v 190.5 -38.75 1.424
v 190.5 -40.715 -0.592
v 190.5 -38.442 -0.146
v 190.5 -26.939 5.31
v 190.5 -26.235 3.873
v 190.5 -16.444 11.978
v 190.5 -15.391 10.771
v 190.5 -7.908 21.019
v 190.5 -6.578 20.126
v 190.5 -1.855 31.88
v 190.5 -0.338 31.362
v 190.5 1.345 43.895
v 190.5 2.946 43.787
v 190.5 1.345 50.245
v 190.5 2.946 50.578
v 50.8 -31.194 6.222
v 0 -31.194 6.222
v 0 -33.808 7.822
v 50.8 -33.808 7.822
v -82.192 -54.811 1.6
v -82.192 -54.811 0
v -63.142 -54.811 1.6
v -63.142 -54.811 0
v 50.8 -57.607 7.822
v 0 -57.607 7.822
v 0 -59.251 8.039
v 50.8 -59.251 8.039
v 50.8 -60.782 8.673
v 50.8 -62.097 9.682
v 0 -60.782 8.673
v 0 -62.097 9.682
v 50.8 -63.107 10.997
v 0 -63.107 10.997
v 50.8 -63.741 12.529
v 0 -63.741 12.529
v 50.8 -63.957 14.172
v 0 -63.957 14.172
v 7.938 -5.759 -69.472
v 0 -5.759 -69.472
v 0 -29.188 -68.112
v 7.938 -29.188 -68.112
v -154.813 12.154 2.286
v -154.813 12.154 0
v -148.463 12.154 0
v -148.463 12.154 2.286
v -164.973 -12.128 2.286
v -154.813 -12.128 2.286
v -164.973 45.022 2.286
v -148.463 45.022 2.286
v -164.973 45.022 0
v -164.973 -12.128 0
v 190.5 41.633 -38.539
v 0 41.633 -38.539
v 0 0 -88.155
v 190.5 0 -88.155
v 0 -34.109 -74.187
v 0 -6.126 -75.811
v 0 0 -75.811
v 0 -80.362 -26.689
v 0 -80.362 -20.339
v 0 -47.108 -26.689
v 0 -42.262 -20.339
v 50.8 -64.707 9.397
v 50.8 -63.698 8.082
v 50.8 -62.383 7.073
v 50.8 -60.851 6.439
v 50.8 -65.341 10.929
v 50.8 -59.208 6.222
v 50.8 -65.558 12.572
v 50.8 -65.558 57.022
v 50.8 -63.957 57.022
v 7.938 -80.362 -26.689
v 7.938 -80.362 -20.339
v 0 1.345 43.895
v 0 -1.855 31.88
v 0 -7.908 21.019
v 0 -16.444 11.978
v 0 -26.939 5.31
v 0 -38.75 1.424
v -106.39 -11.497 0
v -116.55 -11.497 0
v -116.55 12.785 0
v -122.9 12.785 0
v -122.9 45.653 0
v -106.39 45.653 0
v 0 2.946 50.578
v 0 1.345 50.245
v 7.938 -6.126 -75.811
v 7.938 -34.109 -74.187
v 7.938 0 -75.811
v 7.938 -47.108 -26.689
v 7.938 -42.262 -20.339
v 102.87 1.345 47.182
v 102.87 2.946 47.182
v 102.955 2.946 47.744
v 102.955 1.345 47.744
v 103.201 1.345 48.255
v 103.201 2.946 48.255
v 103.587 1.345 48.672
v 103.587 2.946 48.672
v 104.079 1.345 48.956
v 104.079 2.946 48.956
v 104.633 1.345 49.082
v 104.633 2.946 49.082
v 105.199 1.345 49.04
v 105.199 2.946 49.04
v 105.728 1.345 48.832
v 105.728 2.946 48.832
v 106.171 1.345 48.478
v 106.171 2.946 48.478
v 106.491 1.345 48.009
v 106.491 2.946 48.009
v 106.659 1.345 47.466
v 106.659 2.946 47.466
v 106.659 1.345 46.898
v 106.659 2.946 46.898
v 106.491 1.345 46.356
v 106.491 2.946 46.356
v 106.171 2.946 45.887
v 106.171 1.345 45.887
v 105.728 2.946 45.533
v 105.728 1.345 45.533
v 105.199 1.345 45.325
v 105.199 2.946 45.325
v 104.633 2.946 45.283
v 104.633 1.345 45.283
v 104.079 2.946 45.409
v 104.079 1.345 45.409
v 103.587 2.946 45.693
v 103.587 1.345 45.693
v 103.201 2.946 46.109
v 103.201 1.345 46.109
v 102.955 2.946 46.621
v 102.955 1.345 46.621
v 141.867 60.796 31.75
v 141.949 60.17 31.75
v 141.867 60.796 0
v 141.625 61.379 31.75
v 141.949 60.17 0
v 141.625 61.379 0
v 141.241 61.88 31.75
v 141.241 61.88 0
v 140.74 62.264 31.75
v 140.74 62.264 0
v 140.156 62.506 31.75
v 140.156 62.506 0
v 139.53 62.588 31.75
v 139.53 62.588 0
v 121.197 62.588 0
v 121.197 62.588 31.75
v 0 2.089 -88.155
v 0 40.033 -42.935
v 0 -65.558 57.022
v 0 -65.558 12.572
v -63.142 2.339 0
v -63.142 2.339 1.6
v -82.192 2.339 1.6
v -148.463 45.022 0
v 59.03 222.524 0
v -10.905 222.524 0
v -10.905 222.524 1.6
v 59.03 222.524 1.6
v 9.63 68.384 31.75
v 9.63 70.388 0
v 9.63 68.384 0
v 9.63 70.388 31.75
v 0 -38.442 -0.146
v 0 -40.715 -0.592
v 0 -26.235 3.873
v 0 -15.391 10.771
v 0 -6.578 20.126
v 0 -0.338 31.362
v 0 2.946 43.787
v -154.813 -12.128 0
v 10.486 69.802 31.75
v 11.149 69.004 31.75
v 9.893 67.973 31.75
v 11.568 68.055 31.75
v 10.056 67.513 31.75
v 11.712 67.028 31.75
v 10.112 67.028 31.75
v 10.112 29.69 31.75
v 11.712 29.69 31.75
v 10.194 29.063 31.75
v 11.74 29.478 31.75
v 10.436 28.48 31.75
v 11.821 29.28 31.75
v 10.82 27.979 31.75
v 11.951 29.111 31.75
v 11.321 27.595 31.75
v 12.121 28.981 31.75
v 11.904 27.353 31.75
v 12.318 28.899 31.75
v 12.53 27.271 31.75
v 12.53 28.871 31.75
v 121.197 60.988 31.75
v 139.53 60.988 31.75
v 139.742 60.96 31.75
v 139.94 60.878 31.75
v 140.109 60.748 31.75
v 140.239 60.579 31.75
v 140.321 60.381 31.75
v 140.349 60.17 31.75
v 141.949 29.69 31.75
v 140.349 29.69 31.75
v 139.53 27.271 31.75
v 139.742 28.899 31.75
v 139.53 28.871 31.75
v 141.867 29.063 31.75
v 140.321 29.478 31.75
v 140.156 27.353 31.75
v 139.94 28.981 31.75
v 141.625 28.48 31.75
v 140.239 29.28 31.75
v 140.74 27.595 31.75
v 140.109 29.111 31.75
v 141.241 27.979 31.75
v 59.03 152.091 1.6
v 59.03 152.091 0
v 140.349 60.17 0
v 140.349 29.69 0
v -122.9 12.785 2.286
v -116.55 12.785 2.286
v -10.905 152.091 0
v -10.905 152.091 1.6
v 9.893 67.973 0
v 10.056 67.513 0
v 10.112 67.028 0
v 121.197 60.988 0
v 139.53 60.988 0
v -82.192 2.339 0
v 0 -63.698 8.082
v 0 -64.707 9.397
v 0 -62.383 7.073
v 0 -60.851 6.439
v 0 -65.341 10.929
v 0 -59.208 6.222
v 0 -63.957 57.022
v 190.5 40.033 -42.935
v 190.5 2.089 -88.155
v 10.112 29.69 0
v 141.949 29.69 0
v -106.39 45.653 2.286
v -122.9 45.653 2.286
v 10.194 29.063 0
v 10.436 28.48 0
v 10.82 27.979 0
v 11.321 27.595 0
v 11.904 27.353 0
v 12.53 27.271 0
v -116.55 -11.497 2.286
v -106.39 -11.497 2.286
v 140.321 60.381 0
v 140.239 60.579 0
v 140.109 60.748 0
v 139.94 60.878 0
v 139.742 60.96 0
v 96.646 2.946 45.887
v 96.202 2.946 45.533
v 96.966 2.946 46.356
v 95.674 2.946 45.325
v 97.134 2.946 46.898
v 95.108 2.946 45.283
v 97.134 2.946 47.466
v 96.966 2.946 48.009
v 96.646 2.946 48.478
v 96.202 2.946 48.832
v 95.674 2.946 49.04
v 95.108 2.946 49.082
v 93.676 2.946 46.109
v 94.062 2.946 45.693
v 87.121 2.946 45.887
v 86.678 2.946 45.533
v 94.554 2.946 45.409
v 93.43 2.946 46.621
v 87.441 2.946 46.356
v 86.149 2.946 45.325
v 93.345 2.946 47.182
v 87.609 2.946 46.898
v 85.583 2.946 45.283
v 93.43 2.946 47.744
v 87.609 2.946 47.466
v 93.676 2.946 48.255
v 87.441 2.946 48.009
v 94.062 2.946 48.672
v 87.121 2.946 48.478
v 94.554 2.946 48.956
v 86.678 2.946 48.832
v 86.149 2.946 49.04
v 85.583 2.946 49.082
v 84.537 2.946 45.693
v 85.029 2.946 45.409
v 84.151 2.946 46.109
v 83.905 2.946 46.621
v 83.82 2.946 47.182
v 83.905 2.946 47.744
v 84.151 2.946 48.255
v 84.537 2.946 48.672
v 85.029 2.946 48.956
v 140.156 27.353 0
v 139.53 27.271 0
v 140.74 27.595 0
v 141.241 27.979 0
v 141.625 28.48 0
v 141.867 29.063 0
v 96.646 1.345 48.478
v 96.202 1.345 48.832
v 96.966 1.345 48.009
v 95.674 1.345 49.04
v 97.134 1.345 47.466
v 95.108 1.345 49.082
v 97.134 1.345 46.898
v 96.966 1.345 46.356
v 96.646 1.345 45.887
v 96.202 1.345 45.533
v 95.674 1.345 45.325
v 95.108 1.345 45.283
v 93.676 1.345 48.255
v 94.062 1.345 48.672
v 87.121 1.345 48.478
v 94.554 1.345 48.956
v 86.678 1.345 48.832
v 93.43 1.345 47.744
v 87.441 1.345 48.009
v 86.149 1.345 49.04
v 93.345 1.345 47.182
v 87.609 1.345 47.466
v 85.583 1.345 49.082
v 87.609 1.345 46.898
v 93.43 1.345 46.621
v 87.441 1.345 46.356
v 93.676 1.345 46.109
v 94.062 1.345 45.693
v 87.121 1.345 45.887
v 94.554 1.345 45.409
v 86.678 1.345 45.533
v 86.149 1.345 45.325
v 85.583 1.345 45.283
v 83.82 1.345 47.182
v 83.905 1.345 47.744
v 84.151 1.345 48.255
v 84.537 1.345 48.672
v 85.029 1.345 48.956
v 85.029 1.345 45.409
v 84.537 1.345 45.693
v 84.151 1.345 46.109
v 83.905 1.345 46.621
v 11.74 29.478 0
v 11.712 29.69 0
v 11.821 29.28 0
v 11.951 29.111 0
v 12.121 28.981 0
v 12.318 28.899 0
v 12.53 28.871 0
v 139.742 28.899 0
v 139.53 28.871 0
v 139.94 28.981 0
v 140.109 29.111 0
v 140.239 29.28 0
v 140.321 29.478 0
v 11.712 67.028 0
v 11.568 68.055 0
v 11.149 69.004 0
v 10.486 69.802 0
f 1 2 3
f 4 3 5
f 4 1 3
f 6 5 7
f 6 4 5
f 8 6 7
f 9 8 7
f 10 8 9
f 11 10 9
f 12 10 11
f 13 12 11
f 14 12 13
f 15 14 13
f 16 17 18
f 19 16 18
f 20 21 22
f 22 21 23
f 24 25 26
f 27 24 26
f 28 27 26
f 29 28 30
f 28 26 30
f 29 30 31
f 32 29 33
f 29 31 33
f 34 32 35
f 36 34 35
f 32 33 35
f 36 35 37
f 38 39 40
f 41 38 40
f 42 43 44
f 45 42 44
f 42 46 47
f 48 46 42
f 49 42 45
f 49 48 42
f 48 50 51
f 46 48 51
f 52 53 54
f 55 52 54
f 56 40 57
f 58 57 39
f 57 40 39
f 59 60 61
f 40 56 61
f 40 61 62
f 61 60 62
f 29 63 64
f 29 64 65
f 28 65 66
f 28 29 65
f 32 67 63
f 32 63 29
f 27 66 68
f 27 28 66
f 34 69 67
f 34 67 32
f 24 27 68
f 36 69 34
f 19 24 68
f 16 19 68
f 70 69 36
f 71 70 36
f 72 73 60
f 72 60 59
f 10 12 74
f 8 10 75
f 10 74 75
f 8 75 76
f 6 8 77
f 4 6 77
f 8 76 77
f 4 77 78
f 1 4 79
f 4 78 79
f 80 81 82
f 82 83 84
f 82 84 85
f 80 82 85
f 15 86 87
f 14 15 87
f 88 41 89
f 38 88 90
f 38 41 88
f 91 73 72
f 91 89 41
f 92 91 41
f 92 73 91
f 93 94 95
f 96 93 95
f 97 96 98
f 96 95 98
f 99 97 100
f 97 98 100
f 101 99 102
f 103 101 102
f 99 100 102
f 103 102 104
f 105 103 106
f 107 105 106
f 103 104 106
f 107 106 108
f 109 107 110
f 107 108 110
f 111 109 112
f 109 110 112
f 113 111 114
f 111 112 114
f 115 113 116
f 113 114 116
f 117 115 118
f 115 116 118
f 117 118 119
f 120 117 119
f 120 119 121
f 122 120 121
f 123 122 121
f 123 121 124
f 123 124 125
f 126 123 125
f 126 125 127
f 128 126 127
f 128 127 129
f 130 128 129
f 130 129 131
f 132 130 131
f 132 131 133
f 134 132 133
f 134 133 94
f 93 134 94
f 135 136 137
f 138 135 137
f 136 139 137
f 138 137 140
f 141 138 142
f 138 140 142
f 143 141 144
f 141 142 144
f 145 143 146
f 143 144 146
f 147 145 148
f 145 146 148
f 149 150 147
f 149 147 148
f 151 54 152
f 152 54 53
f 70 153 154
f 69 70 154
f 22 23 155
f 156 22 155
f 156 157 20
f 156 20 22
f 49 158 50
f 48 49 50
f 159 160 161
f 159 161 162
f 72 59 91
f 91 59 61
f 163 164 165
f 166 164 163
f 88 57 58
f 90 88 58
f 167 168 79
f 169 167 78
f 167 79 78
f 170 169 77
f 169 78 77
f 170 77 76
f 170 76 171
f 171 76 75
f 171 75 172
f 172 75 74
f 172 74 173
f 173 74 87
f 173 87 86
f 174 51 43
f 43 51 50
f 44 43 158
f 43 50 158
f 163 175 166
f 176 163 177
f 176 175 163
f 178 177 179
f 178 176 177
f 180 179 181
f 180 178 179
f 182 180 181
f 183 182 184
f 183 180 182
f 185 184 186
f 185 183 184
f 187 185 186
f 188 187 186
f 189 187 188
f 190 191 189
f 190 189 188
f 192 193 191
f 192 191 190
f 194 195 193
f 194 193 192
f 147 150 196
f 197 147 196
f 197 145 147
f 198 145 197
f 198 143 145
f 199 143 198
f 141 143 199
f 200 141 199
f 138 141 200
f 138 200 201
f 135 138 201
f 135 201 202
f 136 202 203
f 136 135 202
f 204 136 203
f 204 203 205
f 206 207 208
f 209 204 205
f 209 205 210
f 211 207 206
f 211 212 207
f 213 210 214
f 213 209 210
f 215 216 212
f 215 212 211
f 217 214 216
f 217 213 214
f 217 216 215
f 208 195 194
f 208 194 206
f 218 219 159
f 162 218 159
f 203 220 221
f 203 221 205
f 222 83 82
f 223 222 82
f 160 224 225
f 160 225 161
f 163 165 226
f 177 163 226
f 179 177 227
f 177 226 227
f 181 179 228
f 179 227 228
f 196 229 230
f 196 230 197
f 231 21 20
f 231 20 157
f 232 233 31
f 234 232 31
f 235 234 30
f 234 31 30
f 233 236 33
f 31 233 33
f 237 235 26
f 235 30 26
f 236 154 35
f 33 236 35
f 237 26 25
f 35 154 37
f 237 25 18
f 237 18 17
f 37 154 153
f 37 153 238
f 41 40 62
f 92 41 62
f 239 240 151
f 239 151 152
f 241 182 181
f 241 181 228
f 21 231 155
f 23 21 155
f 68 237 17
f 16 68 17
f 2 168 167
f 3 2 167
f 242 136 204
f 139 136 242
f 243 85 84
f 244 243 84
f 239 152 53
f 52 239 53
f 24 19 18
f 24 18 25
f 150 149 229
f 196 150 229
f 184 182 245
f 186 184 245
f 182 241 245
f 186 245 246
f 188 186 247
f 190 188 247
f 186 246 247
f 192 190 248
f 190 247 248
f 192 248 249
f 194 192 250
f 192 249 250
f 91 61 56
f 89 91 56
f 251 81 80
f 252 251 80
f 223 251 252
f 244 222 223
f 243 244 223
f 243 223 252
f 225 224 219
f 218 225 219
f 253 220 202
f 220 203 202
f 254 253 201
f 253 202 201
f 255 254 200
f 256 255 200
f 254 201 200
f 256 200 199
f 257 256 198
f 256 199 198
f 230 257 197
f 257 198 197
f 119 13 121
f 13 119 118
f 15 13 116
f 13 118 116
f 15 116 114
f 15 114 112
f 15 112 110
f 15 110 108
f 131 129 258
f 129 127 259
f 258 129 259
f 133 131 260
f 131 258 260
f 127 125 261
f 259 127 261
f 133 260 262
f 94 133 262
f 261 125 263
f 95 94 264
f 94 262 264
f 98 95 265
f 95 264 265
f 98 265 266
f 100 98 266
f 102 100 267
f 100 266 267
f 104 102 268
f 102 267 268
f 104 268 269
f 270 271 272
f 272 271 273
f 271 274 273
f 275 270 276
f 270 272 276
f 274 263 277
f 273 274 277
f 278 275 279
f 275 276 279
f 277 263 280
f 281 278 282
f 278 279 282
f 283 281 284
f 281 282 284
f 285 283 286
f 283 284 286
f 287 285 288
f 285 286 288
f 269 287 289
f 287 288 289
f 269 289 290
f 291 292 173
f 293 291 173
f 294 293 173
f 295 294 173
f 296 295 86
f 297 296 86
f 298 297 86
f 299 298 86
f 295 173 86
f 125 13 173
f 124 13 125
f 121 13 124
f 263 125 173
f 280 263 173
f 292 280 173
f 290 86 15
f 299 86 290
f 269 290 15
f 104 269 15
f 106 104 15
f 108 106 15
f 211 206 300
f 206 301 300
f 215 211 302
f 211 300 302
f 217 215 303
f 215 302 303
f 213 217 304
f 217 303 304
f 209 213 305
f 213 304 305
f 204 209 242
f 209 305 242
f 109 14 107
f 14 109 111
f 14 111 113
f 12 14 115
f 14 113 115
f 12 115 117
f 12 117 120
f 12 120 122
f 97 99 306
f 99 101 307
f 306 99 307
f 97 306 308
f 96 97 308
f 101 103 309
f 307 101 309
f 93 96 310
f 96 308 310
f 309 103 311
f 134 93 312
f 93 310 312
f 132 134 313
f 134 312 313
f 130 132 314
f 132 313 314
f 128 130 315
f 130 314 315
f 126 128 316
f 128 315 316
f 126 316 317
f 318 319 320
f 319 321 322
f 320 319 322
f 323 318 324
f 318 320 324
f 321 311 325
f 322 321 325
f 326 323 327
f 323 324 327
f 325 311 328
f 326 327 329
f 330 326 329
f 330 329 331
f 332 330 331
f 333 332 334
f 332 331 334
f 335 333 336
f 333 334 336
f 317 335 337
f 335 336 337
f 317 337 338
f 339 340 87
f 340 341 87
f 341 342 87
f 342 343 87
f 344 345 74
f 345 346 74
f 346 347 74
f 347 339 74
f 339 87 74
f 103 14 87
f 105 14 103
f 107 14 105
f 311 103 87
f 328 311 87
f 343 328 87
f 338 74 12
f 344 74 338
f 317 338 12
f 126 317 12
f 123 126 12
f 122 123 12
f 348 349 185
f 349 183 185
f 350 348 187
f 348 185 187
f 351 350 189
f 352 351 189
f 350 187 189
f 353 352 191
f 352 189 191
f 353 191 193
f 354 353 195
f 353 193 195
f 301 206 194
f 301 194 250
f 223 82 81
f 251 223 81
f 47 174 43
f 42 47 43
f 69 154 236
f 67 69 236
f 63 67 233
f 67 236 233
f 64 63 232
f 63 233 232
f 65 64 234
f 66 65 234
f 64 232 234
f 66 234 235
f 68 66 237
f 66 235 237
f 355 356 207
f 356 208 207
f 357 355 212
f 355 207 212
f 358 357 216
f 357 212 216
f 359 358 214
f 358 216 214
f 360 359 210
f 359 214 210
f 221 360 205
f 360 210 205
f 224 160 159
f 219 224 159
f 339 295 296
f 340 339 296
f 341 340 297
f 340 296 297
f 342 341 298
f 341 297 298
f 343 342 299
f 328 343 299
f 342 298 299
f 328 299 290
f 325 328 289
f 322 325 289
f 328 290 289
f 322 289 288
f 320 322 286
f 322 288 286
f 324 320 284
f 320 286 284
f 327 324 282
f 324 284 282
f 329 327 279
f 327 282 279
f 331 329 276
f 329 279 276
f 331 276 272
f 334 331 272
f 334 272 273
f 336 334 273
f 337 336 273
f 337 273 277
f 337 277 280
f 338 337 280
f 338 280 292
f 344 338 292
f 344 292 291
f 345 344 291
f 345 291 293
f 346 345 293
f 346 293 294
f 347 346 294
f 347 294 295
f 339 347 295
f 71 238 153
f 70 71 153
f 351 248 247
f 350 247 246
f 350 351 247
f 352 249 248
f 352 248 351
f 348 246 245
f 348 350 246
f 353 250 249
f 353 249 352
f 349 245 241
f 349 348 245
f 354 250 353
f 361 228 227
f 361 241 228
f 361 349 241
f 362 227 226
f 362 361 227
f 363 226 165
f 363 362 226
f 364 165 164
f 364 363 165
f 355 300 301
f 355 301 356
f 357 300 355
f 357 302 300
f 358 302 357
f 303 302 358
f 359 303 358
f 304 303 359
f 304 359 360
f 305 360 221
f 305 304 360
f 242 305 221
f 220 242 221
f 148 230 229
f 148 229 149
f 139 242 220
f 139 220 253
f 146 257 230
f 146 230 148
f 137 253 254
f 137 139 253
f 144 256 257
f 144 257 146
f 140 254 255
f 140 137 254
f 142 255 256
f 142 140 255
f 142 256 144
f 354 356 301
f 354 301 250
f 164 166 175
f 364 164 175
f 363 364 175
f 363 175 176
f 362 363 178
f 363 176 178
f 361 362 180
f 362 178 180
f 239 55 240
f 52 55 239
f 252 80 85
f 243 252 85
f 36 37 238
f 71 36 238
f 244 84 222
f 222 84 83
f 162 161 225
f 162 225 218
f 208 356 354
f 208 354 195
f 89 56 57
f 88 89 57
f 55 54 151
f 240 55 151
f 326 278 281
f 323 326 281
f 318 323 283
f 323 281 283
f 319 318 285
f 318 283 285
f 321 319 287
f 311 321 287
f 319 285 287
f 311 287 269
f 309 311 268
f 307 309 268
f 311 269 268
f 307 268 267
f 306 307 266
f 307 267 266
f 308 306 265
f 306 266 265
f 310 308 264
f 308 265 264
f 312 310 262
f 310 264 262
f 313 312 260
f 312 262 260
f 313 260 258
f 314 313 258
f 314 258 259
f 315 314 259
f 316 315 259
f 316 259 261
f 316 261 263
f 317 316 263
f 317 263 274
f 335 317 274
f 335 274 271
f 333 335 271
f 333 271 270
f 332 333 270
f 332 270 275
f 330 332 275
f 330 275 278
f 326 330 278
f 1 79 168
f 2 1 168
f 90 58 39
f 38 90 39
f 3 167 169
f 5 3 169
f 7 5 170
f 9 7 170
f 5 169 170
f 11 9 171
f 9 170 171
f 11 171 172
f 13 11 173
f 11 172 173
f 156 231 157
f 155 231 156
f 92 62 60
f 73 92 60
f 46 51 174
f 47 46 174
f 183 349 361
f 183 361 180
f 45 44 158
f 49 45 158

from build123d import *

# Parameters (mm, degrees)
F1_DEPTH  = 190.5
F2_W      = 19.05
F2_H      = 57.15
F3_DEPTH  = 1.6002
F5_DEPTH  = 190.5
F7_DEPTH  = 50.8
F8_W      = 69.9347853661
F8_H      = 70.4333484173
F21_DEPTH = 1.6002
F22_DEPTH = 7.9375
F10_R     = 1.905
F11_DEPTH = 83.3087024486
F13_DEPTH = 2.286
F15_DEPTH = 2.286
F16_W     = 1.6002
F16_H     = 31.75
F19_W     = 9.6304351464
F19_H     = 31.75
F20_DEPTH = 25.4


# Not quite as in the source:
# - a feature names something its author has since deleted; it is built from what else it names


with BuildPart() as f1:
    # F0 (on Right) → F1 (new body)
    with BuildSketch(Plane.YZ):
        with BuildLine():
            Line((2.9455358163, 50.5775293171), (1.3453358163, 50.2454929949))
            Line((1.3453358163, 50.2454929949), (1.3453358163, 43.8954929949))
            ThreePointArc((1.3453358163, 43.8954929949), (-11.8950260011, 16.2331476976), (-38.7503645073, 1.4242543521))
            Line((-38.7503645073, 1.4242543521), (-40.7147916438, -0.59183615))
            Line((-40.7147916438, -0.59183615), (-38.4423047946, -0.1460129033))
            ThreePointArc((-38.4423047946, -0.1460129033), (-10.6937083452, 15.1746548691), (2.9455358163, 43.7872130318))
            Line((2.9455358163, 43.7872130318), (2.9455358163, 50.5775293171))
        make_face()
    extrude(amount=F1_DEPTH)

    # F10 (on face) → F11 (cut, through all)
    with BuildSketch(Plane(origin=(0, 2.9455358163, 0), x_dir=(-1, 0, 0), z_dir=(0, 1, 0))):
        with Locations((-95.25, 47.1823711745)):
            Circle(F10_R)
        with Locations((-85.725, 47.1823711745)):
            Circle(F10_R)
        with Locations((-104.775, 47.1823711745)):
            Circle(F10_R)
    extrude(amount=-F11_DEPTH, mode=Mode.SUBTRACT)


with BuildPart() as f3:
    # F2 (on Top) → F3 (new body)
    with BuildSketch(Plane.XY):
        with Locations((-72.6671729922, -26.2355463386)):
            Rectangle(F2_W, F2_H)
    extrude(amount=F3_DEPTH)


with BuildPart() as f5:
    # F4 (on Right) → F5 (new body)
    with BuildSketch(Plane.YZ):
        Polygon((40.0331534794, -42.9351368162), (41.6333534794, -38.5386234495), (0, -88.1553220304), (2.0889127444, -88.1553220304), align=None)
    extrude(amount=F5_DEPTH)


with BuildPart() as f7:
    # F6 (on Right) → F7 (new body)
    with BuildSketch(Plane.YZ):
        with BuildLine():
            Line((-63.957339463, 57.0222916961), (-65.557539463, 57.0222916961))
            Line((-65.557539463, 57.0222916961), (-65.557539463, 12.5722916961))
            ThreePointArc((-65.557539463, 12.5722916961), (-63.6976675236, 8.0821636355), (-59.207539463, 6.2222916961))
            Line((-59.207539463, 6.2222916961), (-33.807539463, 6.2222916961))
            Line((-33.807539463, 6.2222916961), (-31.1940032989, 6.2222916961))
            Line((-31.1940032989, 6.2222916961), (-33.807539463, 7.8224916961))
            Line((-33.807539463, 7.8224916961), (-57.607339463, 7.8224916961))
            ThreePointArc((-57.607339463, 7.8224916961), (-62.0974675236, 9.6823636355), (-63.957339463, 14.1724916961))
            Line((-63.957339463, 14.1724916961), (-63.957339463, 57.0222916961))
        make_face()
    extrude(amount=F7_DEPTH)


with BuildPart() as f21:
    # F8 (on Top) → F21 (new body)
    with BuildSketch(Plane.XY):
        with Locations((24.062409997, 187.307536602)):
            Rectangle(F8_W, F8_H)
    extrude(amount=F21_DEPTH)


with BuildPart() as f22:
    # F9 (on Right) → F22 (new body)
    with BuildSketch(Plane.YZ):
        Polygon((-42.2621666323, -20.3390651836), (-80.3621666323, -20.3390651836), (-80.3621666323, -26.6890651836), (-47.1078351951, -26.6890651836), (-34.1087002788, -74.1873922208), (-6.1264390171, -75.8113767203), (0, -75.8113767203), (-5.7585281372, -69.4720438228), (-29.1877967625, -68.1122977778), align=None)
    extrude(amount=F22_DEPTH)


with BuildPart() as f13:
    # F12 (on Top) → F13 (new body)
    with BuildSketch(Plane.XY):
        Polygon((-164.9733781815, 45.0218769178), (-164.9733781815, -12.1281230822), (-154.8133781815, -12.1281230822), (-154.8133781815, 12.1535500512), (-148.4633781815, 12.1535500512), (-148.4633781815, 45.0218769178), align=None)
    extrude(amount=F13_DEPTH)


with BuildPart() as f15:
    # F14 (on Top) → F15 (new body)
    with BuildSketch(Plane.XY):
        Polygon((-106.3901432657, -11.4971105634), (-106.3901432657, 45.6528894366), (-122.9001432657, 45.6528894366), (-122.9001432657, 12.7852894366), (-116.5501432657, 12.7852894366), (-116.5501432657, -11.4971105634), align=None)
    extrude(amount=F15_DEPTH)


with BuildPart() as f18:
    # F18: sweep along a path in F17
    with BuildLine(Plane.XY) as f18_path:
        Line((0, 69.313518703), (7.9582965779, 69.313518703))
        ThreePointArc((7.9582965779, 69.313518703), (9.5747426797, 68.6439648048), (10.2442965779, 67.027518703))
        Line((10.2442965779, 67.027518703), (10.2442965779, 29.689518703))
        ThreePointArc((10.2442965779, 29.689518703), (10.9138504761, 28.0730726012), (12.5302965779, 27.403518703))
        Line((12.5302965779, 27.403518703), (139.5302965779, 27.403518703))
        ThreePointArc((139.5302965779, 27.403518703), (141.1467426797, 28.0730726012), (141.8162965779, 29.689518703))
        Line((141.8162965779, 29.689518703), (141.8162965779, 60.169518703))
        ThreePointArc((141.8162965779, 60.169518703), (141.1467426797, 61.7859648048), (139.5302965779, 62.455518703))
        Line((139.5302965779, 62.455518703), (121.1970292659, 62.455518703))
    # F16 (on Right) → F18 (sweep)
    with BuildSketch(Plane.YZ):
        with Locations((69.9808419062, 15.875)):
            Rectangle(F16_W, F16_H)
    sweep(path=f18_path.line)

    # F19 (on face) → F20 (cut)
    with BuildSketch(Plane(origin=(0, 70.7809419062, 0), x_dir=(-1, 0, 0), z_dir=(0, 1, 0))):
        with Locations((-4.8152175732, 15.875)):
            Rectangle(F19_W, F19_H)
    extrude(amount=-F20_DEPTH, mode=Mode.SUBTRACT)


solid = Compound([f1.part, f3.part, f5.part, f7.part, f21.part, f22.part, f13.part, f15.part, f18.part])
